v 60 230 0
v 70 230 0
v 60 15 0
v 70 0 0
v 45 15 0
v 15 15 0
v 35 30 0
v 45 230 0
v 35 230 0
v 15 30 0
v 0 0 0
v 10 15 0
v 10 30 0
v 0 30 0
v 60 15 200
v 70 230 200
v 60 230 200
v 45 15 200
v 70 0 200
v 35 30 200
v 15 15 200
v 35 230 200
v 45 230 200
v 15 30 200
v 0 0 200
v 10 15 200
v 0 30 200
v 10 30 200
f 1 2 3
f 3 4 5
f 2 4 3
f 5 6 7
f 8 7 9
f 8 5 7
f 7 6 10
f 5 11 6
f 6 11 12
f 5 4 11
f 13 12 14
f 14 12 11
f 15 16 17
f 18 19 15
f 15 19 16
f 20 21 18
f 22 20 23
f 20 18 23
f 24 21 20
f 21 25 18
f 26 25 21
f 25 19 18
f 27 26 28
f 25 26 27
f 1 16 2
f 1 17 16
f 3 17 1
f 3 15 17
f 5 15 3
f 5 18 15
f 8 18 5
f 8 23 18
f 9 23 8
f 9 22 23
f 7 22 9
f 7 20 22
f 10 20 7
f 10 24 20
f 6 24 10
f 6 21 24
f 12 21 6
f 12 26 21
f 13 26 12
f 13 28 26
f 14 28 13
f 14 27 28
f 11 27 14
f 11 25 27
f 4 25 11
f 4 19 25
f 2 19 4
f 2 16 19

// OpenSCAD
/*
Copyright (C) Saeed Gholami Shahbandi. All rights reserved.
Author: Saeed Gholami Shahbandi (saeed.gh.sh@gmail.com)

This file is part of Arrangement Library.
The of Arrangement Library is free software: you can redistribute it and/or
modify it under the terms of the GNU Lesser General Public License as published
by the Free Software Foundation, either version 3 of the License,
or (at your option) any later version.

This program is distributed in the hope that it will be useful, but WITHOUT ANY
WARRANTY; without even the implied warranty of MERCHANTABILITY or FITNESS FOR A
PARTICULAR PURPOSE. See the GNU Lesser General Public License for more details.

You should have received a copy of the GNU Lesser General Public License along
with this program. If not, see <http://www.gnu.org/licenses/>
*/
tol = 0.01;

/*
         _   _
        | | | |
N       | | | |
        | | | |
   _   _| |_| |
M | |_|       |
L |___________|
   A B C D E F 
*/

A = 10;
B = 5;
C = 20;
D = 10;
E = 15;
F = 10;

L = 15;
M = 15;
N = 200;

points = [
     [0, 0], // 1
     [A+B+C+D+E+F, 0], // 2
     [A+B+C+D+E+F, L+M+N], // 3
     [A+B+C+D+E, L+M+N], // 4
     [A+B+C+D+E, L], // 5
     [A+B+C+D, L], // 6
     [A+B+C+D, L+M+N], // 7
     [A+B+C, L+M+N], // 8
     [A+B+C, L+M], // 9
     [A+B, L+M], // 10
     [A+B, L], // 11
     [A, L], // 12
     [A, L+M], // 13
     [0, L+M], // 14
     ];

{
     // cross section
     linear_extrude(height = 200)
          polygon(points);
}
